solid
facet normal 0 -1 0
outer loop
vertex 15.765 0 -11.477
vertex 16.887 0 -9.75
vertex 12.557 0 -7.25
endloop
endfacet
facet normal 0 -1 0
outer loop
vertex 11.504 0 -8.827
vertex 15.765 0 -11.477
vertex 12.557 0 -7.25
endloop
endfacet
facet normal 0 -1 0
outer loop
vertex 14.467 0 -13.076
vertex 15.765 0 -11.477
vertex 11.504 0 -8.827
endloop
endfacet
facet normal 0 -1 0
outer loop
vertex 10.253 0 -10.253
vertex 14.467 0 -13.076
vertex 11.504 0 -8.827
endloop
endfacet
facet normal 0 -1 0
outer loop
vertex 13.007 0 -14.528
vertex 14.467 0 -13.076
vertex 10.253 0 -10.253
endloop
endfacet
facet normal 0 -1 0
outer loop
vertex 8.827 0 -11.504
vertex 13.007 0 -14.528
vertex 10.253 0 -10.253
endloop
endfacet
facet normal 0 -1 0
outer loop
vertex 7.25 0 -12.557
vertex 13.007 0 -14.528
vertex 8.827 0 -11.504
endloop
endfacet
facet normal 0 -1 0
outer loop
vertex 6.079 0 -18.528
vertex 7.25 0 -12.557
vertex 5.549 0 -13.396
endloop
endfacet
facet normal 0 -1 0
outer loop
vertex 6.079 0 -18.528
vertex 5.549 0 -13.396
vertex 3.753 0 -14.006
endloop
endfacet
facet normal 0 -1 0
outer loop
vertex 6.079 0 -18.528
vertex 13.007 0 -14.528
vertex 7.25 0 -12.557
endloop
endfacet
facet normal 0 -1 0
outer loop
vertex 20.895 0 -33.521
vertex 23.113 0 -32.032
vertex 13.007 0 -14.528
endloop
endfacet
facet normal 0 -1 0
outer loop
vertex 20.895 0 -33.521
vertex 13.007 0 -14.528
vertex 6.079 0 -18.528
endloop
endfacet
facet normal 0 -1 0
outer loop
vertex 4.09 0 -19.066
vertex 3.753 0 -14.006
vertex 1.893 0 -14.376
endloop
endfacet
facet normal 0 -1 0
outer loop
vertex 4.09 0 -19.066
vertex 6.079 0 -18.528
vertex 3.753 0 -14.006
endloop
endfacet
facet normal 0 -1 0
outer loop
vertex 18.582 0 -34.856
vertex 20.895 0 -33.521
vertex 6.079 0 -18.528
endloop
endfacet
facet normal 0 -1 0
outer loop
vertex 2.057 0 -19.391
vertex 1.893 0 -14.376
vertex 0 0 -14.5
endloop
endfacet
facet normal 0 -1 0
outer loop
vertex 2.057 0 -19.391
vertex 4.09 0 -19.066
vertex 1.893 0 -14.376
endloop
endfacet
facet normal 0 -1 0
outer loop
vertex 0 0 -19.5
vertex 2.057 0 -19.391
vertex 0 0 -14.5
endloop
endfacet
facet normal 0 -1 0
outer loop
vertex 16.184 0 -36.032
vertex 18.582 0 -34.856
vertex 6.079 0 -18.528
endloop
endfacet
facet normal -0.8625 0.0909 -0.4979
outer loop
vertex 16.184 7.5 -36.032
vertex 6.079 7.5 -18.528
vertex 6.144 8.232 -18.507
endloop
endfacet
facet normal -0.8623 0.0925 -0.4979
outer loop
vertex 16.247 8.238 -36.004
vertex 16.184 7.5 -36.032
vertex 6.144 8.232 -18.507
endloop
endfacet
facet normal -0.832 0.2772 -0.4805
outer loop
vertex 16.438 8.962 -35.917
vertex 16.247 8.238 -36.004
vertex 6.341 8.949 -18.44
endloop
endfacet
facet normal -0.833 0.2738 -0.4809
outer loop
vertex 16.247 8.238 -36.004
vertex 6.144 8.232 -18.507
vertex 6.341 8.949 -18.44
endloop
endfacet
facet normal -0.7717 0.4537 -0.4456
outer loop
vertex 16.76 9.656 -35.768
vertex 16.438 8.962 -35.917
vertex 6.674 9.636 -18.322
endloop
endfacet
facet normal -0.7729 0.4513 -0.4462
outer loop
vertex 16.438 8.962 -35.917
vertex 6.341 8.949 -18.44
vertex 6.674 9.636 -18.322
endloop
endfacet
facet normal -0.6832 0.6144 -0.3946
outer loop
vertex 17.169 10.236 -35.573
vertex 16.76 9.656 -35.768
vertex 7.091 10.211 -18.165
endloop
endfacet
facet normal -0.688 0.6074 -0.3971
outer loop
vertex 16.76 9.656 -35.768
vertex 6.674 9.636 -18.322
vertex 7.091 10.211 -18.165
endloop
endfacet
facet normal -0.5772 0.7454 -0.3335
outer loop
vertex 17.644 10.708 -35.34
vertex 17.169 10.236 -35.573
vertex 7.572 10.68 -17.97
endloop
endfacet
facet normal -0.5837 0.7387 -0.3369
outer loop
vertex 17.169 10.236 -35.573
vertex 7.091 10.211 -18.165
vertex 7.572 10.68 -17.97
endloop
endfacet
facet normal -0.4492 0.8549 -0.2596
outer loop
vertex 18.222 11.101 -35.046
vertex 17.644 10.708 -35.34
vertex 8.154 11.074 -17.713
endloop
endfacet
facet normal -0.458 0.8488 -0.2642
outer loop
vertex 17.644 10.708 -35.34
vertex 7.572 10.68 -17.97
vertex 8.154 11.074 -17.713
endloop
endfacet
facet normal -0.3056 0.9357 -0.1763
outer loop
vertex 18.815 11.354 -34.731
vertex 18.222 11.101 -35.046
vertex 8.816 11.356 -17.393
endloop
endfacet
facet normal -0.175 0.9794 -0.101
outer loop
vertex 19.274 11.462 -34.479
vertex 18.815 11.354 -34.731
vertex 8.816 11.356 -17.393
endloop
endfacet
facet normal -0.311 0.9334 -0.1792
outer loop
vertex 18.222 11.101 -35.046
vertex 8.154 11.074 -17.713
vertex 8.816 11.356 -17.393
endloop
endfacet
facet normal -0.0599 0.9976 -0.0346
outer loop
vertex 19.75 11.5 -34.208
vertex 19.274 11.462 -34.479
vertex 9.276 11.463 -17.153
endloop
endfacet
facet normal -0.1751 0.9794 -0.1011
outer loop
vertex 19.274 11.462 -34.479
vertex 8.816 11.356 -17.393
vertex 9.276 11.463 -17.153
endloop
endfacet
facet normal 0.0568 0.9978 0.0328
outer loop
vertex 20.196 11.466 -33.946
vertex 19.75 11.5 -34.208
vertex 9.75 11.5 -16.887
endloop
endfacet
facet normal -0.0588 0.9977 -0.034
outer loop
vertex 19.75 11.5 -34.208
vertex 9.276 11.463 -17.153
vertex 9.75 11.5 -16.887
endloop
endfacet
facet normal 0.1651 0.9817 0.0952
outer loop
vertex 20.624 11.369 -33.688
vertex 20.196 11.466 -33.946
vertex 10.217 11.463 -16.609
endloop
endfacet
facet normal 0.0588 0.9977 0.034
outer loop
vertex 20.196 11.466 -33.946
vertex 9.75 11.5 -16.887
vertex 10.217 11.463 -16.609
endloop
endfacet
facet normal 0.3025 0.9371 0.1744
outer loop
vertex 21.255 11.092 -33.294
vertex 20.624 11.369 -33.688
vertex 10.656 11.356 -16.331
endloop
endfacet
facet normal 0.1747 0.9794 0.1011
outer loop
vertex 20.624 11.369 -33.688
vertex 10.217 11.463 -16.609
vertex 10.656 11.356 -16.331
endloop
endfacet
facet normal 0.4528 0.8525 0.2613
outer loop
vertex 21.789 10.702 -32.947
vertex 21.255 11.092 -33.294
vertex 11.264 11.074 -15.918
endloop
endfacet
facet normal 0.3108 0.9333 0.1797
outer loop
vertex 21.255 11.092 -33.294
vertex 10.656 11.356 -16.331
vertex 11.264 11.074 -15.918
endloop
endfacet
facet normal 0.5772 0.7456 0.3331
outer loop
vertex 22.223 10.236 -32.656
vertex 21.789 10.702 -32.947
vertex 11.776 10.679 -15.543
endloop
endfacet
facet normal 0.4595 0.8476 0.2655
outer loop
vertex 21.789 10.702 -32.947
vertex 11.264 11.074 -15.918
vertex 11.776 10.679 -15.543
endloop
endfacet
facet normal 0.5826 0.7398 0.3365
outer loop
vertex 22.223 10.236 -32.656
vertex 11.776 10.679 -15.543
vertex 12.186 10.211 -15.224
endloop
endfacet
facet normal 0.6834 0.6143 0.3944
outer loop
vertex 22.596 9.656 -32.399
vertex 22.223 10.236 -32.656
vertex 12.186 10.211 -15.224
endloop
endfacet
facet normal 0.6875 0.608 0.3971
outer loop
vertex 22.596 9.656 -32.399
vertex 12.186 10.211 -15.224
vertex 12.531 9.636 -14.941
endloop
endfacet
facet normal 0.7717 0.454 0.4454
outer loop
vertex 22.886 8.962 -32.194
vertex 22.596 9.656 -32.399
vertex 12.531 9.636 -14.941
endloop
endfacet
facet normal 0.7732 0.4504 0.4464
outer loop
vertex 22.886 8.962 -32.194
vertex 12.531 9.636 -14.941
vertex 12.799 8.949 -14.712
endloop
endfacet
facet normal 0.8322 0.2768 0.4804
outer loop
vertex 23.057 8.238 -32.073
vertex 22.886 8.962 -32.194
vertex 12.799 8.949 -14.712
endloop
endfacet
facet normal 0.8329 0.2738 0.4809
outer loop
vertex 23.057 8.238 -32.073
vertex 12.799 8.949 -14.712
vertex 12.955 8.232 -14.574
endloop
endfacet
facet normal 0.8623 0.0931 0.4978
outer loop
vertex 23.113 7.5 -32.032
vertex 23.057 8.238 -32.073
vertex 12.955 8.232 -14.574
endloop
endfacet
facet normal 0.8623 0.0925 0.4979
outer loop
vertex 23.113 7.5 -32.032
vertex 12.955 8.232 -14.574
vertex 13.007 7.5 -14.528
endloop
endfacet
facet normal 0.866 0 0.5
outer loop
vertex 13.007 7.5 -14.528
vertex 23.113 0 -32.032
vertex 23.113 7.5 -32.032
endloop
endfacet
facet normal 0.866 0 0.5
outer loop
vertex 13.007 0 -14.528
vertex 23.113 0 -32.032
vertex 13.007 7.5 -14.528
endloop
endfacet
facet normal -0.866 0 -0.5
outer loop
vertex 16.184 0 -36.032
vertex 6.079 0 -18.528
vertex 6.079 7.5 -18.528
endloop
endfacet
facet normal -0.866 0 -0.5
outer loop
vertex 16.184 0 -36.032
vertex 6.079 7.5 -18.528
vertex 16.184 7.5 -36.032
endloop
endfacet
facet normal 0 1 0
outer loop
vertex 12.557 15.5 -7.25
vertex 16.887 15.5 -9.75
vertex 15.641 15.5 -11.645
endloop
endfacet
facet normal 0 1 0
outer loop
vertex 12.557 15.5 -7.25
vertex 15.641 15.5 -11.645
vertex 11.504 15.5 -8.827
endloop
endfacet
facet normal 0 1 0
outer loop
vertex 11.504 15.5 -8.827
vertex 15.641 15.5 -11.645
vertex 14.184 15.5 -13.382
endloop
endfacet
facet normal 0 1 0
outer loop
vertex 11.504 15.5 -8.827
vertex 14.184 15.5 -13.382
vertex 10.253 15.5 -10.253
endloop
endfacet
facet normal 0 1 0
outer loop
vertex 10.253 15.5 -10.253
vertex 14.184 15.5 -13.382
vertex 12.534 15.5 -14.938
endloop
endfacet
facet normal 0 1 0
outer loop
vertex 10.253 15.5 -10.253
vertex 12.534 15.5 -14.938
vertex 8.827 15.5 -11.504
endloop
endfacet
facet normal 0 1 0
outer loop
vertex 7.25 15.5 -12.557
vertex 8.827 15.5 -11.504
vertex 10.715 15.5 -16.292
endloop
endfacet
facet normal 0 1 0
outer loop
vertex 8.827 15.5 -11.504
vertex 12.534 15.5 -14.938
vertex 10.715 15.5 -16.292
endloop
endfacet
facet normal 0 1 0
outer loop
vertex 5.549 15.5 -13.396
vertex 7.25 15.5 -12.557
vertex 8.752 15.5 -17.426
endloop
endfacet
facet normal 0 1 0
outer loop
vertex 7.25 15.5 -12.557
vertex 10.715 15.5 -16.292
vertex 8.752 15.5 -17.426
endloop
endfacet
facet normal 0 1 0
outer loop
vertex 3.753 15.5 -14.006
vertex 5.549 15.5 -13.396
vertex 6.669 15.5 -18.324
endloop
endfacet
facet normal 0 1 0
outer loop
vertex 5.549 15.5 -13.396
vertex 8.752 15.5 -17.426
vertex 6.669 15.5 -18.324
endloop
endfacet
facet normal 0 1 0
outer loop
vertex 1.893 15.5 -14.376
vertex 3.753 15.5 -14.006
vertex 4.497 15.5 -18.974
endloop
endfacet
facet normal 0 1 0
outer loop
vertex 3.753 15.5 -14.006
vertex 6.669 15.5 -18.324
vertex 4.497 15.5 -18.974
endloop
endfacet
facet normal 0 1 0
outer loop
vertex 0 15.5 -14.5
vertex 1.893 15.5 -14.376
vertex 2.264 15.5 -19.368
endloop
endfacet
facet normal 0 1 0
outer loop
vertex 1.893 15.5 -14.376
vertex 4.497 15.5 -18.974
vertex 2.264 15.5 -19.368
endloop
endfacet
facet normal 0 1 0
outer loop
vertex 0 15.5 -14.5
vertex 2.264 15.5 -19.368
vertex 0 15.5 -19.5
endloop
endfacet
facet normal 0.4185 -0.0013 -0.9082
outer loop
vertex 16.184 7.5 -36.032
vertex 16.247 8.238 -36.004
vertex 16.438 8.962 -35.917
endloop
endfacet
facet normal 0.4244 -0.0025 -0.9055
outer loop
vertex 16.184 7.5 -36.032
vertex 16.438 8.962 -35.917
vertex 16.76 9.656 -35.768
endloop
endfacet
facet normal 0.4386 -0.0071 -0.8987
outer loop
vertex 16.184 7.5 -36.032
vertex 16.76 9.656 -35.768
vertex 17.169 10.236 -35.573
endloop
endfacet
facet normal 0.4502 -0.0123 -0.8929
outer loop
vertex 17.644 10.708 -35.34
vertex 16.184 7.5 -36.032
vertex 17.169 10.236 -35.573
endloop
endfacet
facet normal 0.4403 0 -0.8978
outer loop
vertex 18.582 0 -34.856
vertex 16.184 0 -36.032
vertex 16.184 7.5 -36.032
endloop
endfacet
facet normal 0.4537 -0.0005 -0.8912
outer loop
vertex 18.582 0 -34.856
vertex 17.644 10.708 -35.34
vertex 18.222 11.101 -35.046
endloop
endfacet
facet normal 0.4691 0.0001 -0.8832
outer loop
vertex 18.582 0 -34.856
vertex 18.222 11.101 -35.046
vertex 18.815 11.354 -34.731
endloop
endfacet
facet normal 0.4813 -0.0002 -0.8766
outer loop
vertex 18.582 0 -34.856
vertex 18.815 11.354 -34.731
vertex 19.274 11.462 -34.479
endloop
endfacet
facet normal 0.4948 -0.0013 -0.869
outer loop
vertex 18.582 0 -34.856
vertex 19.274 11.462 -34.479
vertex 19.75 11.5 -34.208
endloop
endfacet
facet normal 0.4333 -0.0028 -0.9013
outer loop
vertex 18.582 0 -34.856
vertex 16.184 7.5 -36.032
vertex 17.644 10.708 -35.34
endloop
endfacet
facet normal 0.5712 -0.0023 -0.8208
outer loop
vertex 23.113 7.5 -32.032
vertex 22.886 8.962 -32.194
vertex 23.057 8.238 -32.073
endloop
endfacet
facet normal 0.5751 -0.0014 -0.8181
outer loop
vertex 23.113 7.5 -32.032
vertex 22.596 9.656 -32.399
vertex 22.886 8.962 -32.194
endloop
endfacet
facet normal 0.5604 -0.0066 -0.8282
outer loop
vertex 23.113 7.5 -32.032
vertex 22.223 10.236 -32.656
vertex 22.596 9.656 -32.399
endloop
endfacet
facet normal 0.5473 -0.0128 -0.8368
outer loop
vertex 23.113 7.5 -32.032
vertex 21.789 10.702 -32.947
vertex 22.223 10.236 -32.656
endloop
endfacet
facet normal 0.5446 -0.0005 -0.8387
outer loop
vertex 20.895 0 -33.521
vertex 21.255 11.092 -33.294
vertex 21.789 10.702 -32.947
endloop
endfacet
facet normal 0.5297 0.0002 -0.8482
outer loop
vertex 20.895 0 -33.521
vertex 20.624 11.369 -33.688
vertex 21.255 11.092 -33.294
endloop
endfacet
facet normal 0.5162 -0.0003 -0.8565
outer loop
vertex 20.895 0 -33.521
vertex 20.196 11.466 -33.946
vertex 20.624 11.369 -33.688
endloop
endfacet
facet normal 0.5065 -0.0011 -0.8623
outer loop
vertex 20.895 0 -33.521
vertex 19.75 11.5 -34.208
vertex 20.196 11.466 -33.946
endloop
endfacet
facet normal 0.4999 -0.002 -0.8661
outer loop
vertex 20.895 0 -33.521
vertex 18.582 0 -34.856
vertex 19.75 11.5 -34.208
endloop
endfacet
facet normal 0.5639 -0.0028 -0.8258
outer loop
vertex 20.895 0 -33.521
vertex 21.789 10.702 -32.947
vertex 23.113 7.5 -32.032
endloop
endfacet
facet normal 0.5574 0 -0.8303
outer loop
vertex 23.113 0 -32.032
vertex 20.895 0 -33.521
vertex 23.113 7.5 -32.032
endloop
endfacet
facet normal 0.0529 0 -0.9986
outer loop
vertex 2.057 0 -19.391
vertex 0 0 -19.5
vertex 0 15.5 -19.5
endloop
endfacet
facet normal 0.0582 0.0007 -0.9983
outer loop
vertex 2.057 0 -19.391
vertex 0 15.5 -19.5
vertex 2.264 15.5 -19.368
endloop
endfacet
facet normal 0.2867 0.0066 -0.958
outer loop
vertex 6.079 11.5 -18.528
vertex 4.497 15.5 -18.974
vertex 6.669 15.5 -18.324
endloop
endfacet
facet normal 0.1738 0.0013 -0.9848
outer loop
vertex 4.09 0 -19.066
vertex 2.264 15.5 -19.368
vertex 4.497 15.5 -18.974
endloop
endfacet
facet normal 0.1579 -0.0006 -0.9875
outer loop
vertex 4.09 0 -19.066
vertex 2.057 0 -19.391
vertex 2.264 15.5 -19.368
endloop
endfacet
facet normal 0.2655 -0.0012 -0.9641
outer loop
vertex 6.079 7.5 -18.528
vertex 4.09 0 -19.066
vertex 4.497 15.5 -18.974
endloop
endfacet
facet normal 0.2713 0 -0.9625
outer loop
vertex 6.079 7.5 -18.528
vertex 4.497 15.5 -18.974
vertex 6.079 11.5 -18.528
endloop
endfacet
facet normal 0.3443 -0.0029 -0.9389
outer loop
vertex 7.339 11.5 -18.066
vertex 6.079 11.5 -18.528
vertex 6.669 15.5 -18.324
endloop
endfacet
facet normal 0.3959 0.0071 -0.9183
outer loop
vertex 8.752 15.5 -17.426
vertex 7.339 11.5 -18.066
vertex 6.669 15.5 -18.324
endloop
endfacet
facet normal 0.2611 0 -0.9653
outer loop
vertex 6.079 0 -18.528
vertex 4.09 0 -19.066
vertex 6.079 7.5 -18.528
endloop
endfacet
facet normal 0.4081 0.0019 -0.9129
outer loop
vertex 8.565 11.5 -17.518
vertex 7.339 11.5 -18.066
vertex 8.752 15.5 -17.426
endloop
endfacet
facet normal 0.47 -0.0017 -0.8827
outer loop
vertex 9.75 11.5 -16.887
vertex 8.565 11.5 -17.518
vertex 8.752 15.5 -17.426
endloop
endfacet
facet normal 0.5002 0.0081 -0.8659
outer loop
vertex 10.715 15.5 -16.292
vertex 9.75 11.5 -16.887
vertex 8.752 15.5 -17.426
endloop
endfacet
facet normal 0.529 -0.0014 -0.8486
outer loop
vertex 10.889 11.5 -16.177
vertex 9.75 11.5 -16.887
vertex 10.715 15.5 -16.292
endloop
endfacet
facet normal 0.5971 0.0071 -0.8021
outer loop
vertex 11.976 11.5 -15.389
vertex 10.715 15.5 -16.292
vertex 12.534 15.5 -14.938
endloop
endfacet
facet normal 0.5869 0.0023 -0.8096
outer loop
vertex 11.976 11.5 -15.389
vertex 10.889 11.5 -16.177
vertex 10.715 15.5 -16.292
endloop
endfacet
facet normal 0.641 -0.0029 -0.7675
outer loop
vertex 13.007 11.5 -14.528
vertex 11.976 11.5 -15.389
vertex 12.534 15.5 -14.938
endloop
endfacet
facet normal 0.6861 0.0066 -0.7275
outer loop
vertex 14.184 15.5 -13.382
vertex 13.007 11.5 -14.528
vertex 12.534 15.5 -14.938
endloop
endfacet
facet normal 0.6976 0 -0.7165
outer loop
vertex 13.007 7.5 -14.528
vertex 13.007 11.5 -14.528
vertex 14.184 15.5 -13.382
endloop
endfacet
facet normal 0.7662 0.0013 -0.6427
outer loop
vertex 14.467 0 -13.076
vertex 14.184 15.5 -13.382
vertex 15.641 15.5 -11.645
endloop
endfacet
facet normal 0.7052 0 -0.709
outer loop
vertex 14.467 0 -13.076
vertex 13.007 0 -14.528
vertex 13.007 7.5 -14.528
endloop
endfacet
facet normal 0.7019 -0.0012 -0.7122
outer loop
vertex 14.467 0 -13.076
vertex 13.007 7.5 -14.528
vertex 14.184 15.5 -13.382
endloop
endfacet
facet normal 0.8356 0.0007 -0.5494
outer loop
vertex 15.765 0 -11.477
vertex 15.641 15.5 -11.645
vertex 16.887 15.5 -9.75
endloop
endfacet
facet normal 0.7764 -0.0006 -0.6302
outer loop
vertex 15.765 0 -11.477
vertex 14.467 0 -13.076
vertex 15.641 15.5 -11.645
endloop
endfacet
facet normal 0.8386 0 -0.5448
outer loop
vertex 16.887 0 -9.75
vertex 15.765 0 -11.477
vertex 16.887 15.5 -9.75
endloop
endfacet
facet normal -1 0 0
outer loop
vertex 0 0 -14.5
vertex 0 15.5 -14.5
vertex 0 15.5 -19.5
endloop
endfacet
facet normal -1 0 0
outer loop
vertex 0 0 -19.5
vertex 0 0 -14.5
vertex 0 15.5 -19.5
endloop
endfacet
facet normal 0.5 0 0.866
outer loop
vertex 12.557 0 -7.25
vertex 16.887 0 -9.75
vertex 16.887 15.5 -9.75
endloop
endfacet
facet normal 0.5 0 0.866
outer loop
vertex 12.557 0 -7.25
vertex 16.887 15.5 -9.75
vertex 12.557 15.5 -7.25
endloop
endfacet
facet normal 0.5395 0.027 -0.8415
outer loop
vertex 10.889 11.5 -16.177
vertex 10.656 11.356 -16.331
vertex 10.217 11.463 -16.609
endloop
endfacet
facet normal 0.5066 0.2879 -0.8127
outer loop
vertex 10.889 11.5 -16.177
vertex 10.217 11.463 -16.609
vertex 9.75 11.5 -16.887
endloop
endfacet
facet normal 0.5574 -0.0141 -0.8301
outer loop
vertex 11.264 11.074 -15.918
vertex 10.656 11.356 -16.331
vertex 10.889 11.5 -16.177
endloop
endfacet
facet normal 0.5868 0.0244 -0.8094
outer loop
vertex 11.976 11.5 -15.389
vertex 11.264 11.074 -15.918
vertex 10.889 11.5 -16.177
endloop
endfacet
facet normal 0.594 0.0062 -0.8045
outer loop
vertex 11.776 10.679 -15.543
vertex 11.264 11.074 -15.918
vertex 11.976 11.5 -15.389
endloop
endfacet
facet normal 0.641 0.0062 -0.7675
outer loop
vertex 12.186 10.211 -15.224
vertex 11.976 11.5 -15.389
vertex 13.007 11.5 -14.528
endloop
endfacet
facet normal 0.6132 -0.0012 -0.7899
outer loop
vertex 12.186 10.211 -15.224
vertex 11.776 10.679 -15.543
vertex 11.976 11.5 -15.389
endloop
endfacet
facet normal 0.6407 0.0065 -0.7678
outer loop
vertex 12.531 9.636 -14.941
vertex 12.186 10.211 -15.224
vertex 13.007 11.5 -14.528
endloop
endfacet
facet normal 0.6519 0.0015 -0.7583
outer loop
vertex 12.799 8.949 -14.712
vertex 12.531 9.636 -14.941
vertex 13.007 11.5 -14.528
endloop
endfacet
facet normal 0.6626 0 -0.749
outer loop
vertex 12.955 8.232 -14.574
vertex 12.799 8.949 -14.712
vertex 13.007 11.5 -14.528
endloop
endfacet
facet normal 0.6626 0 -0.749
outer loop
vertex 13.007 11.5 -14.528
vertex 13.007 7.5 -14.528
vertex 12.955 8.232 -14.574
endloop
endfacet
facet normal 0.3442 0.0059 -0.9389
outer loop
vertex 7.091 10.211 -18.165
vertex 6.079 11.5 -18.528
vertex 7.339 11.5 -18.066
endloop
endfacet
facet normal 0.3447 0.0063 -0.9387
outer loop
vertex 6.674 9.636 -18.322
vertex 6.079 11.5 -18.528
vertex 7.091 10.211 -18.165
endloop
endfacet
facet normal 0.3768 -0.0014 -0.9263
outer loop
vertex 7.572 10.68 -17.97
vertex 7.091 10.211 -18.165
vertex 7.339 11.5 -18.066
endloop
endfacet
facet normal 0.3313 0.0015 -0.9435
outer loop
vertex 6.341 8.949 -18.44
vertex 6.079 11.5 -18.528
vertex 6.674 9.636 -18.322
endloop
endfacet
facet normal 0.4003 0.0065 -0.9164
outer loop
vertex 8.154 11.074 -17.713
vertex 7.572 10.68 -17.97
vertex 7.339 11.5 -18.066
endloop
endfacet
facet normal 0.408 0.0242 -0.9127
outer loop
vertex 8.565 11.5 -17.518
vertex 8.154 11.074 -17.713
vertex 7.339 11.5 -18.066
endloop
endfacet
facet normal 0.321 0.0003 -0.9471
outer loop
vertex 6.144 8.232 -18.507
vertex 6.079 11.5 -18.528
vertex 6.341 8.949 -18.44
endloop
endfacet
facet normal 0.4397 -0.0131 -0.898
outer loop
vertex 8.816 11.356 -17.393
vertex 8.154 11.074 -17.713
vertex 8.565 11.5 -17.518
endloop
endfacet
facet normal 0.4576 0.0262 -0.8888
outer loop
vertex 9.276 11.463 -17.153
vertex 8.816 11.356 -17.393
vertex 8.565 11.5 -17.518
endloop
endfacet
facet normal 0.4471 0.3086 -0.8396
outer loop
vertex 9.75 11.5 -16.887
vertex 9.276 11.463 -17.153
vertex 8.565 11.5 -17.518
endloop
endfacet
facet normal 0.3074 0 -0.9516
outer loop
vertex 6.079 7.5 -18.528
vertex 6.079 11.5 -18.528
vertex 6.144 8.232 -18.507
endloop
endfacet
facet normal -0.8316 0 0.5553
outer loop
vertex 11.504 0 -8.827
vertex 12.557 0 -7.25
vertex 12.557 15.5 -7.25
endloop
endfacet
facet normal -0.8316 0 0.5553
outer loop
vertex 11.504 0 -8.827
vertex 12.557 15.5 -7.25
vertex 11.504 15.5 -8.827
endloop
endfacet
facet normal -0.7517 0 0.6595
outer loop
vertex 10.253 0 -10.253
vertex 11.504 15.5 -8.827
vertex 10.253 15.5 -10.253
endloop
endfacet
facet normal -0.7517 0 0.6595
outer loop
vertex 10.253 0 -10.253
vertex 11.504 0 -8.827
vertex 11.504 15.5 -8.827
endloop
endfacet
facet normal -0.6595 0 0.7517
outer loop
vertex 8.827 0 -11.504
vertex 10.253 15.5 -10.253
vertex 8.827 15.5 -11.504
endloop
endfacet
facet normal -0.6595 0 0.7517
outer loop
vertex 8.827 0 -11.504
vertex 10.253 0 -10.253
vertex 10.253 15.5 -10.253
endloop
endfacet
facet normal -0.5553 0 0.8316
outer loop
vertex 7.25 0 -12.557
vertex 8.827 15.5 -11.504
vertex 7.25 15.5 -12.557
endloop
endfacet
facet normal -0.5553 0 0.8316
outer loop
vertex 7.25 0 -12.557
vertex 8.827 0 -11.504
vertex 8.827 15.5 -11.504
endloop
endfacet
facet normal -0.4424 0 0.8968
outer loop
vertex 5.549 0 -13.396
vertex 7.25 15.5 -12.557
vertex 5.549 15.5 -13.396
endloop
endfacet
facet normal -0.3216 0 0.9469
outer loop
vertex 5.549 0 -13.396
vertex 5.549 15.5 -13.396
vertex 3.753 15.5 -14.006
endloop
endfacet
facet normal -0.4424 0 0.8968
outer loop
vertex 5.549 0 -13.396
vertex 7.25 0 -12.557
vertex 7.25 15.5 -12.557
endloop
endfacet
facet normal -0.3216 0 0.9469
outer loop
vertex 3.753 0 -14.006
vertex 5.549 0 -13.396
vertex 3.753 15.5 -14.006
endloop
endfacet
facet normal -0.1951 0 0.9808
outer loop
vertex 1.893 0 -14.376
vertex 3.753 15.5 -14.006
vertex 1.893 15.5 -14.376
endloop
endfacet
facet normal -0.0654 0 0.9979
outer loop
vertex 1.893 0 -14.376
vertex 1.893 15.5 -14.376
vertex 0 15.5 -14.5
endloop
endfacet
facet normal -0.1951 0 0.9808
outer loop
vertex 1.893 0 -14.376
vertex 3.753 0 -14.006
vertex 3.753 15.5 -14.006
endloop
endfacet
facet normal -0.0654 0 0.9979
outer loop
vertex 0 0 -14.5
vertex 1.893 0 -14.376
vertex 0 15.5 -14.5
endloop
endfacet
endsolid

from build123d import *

# Parameters (mm, degrees)
BOSS_EXTRUDE1_DEPTH = 15.5
BOSS_EXTRUDE2_DEPTH = 11.5
FILLET1_R           = 4


with BuildPart() as part:
    # Sketch3 → Boss-Extrude1 (new body)
    with BuildSketch(Plane(origin=(0, 0, 0), x_dir=(1, 0, 0), z_dir=(0, 1, 0))):
        with BuildLine():
            Line((0, 14.5), (0, 19.5))
            ThreePointArc((0, 19.5), (9.75, 16.887495374), (16.887495374, 9.75))
            Line((16.887495374, 9.75), (12.557368355, 7.25))
            ThreePointArc((12.557368355, 7.25), (7.25, 12.557368355), (0, 14.5))
        make_face()
    extrude(amount=BOSS_EXTRUDE1_DEPTH)

    # Sketch5 → Boss-Extrude2 (add)
    with BuildSketch(Plane.XZ):
        with BuildLine():
            Line((6.078565727, -18.528384676), (16.184371608, -36.032153914))
            ThreePointArc((16.184371608, -36.032153914), (19.75, -34.208003449), (23.112574838, -32.032153914))
            Line((23.112574838, -32.032153914), (13.006768957, -14.528384676))
            ThreePointArc((13.006768957, -14.528384676), (9.75, -16.887495374), (6.078565727, -18.528384676))
        make_face()
    extrude(amount=-BOSS_EXTRUDE2_DEPTH)

    # Fillet1
    # the kernel refuses this fillet: 4 mm, written as the material it takes off along each edge
    with BuildSketch(Plane(origin=(28.112574838, 11.5, -40.692407951), x_dir=(-0.8660254037844415, 0, -0.4999999999999951), z_dir=(-0.49999999999999506, 0, 0.8660254037844415))) as fillet1_piece_1_section:
        with BuildLine():
            CenterArc((FILLET1_R, FILLET1_R), FILLET1_R, 180, 90)
            Line((0, FILLET1_R), (0, 0))
            Line((0, 0), (FILLET1_R, 0))
        make_face()
    fillet1_piece_1 = extrude(amount=40.211611762, mode=Mode.PRIVATE)
    fillet1_piece_1 = fillet1_piece_1 - Plane(origin=(0, 10.592283231, 0), x_dir=(0, 0, -1), z_dir=(0, -1, 0)) * Cylinder(19.5, 97, mode=Mode.PRIVATE)
    add(fillet1_piece_1, mode=Mode.SUBTRACT)
    with BuildSketch(Plane(origin=(1.078565727, 11.5, -9.868130638), x_dir=(0, -1, 0), z_dir=(0.49999999999999506, 0, -0.8660254037844415))) as fillet1_piece_2_section:
        with BuildLine():
            CenterArc((FILLET1_R, -FILLET1_R), FILLET1_R, 90, 90)
            Line((0, -FILLET1_R), (0, 0))
            Line((0, 0), (FILLET1_R, 0))
        make_face()
    fillet1_piece_2 = extrude(amount=40.211611762, mode=Mode.PRIVATE)
    fillet1_piece_2 = fillet1_piece_2 - Plane(origin=(0, 10.592276743, 0), x_dir=(0, 0, -1), z_dir=(0, -1, 0)) * Cylinder(19.5, 97, mode=Mode.PRIVATE)
    add(fillet1_piece_2, mode=Mode.SUBTRACT)


solid = part.part
